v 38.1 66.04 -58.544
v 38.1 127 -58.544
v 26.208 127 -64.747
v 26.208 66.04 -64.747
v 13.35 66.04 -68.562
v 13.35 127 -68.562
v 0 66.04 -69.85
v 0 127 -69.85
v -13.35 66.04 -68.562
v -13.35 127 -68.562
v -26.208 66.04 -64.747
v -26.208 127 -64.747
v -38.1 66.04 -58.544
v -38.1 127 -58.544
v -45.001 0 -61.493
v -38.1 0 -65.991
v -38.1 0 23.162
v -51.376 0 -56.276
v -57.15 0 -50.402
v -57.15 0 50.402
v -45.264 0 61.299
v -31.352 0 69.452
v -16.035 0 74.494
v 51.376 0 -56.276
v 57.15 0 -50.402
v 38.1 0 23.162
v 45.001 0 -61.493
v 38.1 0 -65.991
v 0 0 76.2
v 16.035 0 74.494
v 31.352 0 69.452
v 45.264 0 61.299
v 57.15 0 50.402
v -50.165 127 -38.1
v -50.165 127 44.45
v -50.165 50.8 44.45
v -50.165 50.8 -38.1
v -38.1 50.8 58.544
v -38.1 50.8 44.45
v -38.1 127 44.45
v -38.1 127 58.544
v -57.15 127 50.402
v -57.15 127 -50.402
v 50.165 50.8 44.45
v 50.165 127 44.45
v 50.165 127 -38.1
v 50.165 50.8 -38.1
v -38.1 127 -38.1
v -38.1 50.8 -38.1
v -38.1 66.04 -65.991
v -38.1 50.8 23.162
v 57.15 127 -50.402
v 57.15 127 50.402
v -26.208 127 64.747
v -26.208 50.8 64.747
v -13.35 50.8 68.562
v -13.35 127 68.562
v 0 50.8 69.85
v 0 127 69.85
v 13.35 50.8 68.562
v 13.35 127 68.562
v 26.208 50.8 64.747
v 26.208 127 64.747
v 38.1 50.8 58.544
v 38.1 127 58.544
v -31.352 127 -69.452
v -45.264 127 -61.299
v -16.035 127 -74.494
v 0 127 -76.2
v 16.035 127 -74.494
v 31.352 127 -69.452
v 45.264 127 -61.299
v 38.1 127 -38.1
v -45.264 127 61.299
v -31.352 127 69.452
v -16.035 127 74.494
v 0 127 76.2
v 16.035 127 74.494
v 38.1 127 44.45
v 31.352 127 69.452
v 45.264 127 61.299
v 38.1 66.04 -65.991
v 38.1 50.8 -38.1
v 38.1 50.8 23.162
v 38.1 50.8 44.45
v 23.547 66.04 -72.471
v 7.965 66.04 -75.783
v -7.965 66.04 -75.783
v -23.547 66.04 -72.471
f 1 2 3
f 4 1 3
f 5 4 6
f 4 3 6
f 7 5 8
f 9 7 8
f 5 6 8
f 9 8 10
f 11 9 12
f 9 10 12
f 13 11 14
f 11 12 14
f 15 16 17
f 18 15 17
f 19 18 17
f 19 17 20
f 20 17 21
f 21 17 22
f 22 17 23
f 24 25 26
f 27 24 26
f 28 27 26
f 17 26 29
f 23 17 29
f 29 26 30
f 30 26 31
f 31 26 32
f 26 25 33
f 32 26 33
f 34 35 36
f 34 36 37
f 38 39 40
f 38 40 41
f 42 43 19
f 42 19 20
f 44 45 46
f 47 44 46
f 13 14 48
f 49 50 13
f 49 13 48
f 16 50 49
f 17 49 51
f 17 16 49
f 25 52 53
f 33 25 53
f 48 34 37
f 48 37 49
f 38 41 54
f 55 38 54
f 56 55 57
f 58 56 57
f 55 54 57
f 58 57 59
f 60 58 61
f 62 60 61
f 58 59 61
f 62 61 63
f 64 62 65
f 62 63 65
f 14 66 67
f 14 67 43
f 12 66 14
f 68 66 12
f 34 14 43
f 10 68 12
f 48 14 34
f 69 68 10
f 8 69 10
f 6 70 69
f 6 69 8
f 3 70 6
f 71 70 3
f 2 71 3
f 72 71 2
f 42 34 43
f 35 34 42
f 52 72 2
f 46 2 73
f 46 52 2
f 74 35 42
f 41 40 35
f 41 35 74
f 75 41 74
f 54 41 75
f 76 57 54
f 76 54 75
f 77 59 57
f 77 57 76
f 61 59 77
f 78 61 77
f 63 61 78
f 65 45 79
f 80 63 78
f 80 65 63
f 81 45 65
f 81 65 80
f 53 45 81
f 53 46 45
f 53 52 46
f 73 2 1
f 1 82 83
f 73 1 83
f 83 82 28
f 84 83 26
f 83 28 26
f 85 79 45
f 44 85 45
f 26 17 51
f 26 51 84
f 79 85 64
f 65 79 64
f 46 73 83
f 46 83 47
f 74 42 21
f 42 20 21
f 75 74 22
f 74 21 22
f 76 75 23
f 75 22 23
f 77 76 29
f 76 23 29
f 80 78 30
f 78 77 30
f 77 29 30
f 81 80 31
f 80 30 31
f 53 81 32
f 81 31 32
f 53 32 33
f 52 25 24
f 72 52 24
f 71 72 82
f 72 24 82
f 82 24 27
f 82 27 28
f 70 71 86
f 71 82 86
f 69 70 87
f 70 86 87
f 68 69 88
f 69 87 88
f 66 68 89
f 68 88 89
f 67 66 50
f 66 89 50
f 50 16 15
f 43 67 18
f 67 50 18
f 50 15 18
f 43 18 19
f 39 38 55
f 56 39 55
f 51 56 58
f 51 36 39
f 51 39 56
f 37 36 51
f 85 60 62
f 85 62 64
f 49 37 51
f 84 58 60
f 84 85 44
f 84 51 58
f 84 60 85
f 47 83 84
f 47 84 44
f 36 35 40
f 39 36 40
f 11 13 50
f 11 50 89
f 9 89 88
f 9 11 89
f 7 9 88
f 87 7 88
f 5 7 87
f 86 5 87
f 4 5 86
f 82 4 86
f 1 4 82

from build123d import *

# Parameters (mm, degrees)
SKETCH1_R           = 76.2
BOSS_EXTRUDE1_DEPTH = 127
CUT_EXTRUDE1_DEPTH  = 76.2
SKETCH3_W           = 76.2
SKETCH3_H           = 89.15290971
CUT_EXTRUDE2_DEPTH  = 66.04
CUT_EXTRUDE4_DEPTH  = 167.558938517
SKETCH6_W           = 100.33
SKETCH6_H           = 82.55
CUT_EXTRUDE6_DEPTH  = 76.2


with BuildPart() as part:
    # Sketch1 → Boss-Extrude1 (new body)
    with BuildSketch(Plane(origin=(0, 0, 0), x_dir=(1, 0, 0), z_dir=(0, 1, 0))):
        with Locations(Location((0, 0, 0), (0, 0, 270))):
            Circle(SKETCH1_R)
    extrude(amount=BOSS_EXTRUDE1_DEPTH)

    # Sketch2 → Cut-Extrude1 (cut)
    with BuildSketch(Plane(origin=(0, 127, 0), x_dir=(1, 0, 0), z_dir=(0, 1, 0))):
        with BuildLine():
            Line((38.1, -58.544107304), (38.1, 58.544107304))
            ThreePointArc((38.1, 58.544107304), (0, 69.85), (-38.1, 58.544107304))
            Line((-38.1, 58.544107304), (-38.1, -58.544107304))
            ThreePointArc((-38.1, -58.544107304), (0, -69.85), (38.1, -58.544107304))
        make_face()
    extrude(amount=-CUT_EXTRUDE1_DEPTH, mode=Mode.SUBTRACT)

    # Sketch3 → Cut-Extrude2 (cut)
    with BuildSketch(Plane.XZ):
        with Locations((0, -21.414680913)):
            Rectangle(SKETCH3_W, SKETCH3_H)
        with BuildLine():
            Line((38.1, -65.991135768), (-38.1, -65.991135768))
            ThreePointArc((-38.1, -65.991135768), (0, -76.2), (38.1, -65.991135768))
        make_face()
    extrude(amount=-CUT_EXTRUDE2_DEPTH, mode=Mode.SUBTRACT)

    # Sketch5 → Cut-Extrude4 (cut, through all)
    with BuildSketch(Plane(origin=(0, 127, 0), x_dir=(1, 0, 0), z_dir=(0, 1, 0))):
        with BuildLine():
            Line((-57.15, 50.401562476), (-57.15, -50.401562476))
            ThreePointArc((-57.15, -50.401562476), (-76.2, 0), (-57.15, 50.401562476))
        make_face()
        with BuildLine():
            Line((57.15, 50.401562476), (57.15, -50.401562476))
            ThreePointArc((57.15, -50.401562476), (76.2, 0), (57.15, 50.401562476))
        make_face()
    extrude(amount=-CUT_EXTRUDE4_DEPTH, mode=Mode.SUBTRACT)

    # Sketch6 → Cut-Extrude6 (cut)
    with BuildSketch(Plane(origin=(0, 127, 0), x_dir=(1, 0, 0), z_dir=(0, 1, 0))):
        with Locations((0, -3.175)):
            Rectangle(SKETCH6_W, SKETCH6_H)
    extrude(amount=-CUT_EXTRUDE6_DEPTH, mode=Mode.SUBTRACT)


solid = part.part
